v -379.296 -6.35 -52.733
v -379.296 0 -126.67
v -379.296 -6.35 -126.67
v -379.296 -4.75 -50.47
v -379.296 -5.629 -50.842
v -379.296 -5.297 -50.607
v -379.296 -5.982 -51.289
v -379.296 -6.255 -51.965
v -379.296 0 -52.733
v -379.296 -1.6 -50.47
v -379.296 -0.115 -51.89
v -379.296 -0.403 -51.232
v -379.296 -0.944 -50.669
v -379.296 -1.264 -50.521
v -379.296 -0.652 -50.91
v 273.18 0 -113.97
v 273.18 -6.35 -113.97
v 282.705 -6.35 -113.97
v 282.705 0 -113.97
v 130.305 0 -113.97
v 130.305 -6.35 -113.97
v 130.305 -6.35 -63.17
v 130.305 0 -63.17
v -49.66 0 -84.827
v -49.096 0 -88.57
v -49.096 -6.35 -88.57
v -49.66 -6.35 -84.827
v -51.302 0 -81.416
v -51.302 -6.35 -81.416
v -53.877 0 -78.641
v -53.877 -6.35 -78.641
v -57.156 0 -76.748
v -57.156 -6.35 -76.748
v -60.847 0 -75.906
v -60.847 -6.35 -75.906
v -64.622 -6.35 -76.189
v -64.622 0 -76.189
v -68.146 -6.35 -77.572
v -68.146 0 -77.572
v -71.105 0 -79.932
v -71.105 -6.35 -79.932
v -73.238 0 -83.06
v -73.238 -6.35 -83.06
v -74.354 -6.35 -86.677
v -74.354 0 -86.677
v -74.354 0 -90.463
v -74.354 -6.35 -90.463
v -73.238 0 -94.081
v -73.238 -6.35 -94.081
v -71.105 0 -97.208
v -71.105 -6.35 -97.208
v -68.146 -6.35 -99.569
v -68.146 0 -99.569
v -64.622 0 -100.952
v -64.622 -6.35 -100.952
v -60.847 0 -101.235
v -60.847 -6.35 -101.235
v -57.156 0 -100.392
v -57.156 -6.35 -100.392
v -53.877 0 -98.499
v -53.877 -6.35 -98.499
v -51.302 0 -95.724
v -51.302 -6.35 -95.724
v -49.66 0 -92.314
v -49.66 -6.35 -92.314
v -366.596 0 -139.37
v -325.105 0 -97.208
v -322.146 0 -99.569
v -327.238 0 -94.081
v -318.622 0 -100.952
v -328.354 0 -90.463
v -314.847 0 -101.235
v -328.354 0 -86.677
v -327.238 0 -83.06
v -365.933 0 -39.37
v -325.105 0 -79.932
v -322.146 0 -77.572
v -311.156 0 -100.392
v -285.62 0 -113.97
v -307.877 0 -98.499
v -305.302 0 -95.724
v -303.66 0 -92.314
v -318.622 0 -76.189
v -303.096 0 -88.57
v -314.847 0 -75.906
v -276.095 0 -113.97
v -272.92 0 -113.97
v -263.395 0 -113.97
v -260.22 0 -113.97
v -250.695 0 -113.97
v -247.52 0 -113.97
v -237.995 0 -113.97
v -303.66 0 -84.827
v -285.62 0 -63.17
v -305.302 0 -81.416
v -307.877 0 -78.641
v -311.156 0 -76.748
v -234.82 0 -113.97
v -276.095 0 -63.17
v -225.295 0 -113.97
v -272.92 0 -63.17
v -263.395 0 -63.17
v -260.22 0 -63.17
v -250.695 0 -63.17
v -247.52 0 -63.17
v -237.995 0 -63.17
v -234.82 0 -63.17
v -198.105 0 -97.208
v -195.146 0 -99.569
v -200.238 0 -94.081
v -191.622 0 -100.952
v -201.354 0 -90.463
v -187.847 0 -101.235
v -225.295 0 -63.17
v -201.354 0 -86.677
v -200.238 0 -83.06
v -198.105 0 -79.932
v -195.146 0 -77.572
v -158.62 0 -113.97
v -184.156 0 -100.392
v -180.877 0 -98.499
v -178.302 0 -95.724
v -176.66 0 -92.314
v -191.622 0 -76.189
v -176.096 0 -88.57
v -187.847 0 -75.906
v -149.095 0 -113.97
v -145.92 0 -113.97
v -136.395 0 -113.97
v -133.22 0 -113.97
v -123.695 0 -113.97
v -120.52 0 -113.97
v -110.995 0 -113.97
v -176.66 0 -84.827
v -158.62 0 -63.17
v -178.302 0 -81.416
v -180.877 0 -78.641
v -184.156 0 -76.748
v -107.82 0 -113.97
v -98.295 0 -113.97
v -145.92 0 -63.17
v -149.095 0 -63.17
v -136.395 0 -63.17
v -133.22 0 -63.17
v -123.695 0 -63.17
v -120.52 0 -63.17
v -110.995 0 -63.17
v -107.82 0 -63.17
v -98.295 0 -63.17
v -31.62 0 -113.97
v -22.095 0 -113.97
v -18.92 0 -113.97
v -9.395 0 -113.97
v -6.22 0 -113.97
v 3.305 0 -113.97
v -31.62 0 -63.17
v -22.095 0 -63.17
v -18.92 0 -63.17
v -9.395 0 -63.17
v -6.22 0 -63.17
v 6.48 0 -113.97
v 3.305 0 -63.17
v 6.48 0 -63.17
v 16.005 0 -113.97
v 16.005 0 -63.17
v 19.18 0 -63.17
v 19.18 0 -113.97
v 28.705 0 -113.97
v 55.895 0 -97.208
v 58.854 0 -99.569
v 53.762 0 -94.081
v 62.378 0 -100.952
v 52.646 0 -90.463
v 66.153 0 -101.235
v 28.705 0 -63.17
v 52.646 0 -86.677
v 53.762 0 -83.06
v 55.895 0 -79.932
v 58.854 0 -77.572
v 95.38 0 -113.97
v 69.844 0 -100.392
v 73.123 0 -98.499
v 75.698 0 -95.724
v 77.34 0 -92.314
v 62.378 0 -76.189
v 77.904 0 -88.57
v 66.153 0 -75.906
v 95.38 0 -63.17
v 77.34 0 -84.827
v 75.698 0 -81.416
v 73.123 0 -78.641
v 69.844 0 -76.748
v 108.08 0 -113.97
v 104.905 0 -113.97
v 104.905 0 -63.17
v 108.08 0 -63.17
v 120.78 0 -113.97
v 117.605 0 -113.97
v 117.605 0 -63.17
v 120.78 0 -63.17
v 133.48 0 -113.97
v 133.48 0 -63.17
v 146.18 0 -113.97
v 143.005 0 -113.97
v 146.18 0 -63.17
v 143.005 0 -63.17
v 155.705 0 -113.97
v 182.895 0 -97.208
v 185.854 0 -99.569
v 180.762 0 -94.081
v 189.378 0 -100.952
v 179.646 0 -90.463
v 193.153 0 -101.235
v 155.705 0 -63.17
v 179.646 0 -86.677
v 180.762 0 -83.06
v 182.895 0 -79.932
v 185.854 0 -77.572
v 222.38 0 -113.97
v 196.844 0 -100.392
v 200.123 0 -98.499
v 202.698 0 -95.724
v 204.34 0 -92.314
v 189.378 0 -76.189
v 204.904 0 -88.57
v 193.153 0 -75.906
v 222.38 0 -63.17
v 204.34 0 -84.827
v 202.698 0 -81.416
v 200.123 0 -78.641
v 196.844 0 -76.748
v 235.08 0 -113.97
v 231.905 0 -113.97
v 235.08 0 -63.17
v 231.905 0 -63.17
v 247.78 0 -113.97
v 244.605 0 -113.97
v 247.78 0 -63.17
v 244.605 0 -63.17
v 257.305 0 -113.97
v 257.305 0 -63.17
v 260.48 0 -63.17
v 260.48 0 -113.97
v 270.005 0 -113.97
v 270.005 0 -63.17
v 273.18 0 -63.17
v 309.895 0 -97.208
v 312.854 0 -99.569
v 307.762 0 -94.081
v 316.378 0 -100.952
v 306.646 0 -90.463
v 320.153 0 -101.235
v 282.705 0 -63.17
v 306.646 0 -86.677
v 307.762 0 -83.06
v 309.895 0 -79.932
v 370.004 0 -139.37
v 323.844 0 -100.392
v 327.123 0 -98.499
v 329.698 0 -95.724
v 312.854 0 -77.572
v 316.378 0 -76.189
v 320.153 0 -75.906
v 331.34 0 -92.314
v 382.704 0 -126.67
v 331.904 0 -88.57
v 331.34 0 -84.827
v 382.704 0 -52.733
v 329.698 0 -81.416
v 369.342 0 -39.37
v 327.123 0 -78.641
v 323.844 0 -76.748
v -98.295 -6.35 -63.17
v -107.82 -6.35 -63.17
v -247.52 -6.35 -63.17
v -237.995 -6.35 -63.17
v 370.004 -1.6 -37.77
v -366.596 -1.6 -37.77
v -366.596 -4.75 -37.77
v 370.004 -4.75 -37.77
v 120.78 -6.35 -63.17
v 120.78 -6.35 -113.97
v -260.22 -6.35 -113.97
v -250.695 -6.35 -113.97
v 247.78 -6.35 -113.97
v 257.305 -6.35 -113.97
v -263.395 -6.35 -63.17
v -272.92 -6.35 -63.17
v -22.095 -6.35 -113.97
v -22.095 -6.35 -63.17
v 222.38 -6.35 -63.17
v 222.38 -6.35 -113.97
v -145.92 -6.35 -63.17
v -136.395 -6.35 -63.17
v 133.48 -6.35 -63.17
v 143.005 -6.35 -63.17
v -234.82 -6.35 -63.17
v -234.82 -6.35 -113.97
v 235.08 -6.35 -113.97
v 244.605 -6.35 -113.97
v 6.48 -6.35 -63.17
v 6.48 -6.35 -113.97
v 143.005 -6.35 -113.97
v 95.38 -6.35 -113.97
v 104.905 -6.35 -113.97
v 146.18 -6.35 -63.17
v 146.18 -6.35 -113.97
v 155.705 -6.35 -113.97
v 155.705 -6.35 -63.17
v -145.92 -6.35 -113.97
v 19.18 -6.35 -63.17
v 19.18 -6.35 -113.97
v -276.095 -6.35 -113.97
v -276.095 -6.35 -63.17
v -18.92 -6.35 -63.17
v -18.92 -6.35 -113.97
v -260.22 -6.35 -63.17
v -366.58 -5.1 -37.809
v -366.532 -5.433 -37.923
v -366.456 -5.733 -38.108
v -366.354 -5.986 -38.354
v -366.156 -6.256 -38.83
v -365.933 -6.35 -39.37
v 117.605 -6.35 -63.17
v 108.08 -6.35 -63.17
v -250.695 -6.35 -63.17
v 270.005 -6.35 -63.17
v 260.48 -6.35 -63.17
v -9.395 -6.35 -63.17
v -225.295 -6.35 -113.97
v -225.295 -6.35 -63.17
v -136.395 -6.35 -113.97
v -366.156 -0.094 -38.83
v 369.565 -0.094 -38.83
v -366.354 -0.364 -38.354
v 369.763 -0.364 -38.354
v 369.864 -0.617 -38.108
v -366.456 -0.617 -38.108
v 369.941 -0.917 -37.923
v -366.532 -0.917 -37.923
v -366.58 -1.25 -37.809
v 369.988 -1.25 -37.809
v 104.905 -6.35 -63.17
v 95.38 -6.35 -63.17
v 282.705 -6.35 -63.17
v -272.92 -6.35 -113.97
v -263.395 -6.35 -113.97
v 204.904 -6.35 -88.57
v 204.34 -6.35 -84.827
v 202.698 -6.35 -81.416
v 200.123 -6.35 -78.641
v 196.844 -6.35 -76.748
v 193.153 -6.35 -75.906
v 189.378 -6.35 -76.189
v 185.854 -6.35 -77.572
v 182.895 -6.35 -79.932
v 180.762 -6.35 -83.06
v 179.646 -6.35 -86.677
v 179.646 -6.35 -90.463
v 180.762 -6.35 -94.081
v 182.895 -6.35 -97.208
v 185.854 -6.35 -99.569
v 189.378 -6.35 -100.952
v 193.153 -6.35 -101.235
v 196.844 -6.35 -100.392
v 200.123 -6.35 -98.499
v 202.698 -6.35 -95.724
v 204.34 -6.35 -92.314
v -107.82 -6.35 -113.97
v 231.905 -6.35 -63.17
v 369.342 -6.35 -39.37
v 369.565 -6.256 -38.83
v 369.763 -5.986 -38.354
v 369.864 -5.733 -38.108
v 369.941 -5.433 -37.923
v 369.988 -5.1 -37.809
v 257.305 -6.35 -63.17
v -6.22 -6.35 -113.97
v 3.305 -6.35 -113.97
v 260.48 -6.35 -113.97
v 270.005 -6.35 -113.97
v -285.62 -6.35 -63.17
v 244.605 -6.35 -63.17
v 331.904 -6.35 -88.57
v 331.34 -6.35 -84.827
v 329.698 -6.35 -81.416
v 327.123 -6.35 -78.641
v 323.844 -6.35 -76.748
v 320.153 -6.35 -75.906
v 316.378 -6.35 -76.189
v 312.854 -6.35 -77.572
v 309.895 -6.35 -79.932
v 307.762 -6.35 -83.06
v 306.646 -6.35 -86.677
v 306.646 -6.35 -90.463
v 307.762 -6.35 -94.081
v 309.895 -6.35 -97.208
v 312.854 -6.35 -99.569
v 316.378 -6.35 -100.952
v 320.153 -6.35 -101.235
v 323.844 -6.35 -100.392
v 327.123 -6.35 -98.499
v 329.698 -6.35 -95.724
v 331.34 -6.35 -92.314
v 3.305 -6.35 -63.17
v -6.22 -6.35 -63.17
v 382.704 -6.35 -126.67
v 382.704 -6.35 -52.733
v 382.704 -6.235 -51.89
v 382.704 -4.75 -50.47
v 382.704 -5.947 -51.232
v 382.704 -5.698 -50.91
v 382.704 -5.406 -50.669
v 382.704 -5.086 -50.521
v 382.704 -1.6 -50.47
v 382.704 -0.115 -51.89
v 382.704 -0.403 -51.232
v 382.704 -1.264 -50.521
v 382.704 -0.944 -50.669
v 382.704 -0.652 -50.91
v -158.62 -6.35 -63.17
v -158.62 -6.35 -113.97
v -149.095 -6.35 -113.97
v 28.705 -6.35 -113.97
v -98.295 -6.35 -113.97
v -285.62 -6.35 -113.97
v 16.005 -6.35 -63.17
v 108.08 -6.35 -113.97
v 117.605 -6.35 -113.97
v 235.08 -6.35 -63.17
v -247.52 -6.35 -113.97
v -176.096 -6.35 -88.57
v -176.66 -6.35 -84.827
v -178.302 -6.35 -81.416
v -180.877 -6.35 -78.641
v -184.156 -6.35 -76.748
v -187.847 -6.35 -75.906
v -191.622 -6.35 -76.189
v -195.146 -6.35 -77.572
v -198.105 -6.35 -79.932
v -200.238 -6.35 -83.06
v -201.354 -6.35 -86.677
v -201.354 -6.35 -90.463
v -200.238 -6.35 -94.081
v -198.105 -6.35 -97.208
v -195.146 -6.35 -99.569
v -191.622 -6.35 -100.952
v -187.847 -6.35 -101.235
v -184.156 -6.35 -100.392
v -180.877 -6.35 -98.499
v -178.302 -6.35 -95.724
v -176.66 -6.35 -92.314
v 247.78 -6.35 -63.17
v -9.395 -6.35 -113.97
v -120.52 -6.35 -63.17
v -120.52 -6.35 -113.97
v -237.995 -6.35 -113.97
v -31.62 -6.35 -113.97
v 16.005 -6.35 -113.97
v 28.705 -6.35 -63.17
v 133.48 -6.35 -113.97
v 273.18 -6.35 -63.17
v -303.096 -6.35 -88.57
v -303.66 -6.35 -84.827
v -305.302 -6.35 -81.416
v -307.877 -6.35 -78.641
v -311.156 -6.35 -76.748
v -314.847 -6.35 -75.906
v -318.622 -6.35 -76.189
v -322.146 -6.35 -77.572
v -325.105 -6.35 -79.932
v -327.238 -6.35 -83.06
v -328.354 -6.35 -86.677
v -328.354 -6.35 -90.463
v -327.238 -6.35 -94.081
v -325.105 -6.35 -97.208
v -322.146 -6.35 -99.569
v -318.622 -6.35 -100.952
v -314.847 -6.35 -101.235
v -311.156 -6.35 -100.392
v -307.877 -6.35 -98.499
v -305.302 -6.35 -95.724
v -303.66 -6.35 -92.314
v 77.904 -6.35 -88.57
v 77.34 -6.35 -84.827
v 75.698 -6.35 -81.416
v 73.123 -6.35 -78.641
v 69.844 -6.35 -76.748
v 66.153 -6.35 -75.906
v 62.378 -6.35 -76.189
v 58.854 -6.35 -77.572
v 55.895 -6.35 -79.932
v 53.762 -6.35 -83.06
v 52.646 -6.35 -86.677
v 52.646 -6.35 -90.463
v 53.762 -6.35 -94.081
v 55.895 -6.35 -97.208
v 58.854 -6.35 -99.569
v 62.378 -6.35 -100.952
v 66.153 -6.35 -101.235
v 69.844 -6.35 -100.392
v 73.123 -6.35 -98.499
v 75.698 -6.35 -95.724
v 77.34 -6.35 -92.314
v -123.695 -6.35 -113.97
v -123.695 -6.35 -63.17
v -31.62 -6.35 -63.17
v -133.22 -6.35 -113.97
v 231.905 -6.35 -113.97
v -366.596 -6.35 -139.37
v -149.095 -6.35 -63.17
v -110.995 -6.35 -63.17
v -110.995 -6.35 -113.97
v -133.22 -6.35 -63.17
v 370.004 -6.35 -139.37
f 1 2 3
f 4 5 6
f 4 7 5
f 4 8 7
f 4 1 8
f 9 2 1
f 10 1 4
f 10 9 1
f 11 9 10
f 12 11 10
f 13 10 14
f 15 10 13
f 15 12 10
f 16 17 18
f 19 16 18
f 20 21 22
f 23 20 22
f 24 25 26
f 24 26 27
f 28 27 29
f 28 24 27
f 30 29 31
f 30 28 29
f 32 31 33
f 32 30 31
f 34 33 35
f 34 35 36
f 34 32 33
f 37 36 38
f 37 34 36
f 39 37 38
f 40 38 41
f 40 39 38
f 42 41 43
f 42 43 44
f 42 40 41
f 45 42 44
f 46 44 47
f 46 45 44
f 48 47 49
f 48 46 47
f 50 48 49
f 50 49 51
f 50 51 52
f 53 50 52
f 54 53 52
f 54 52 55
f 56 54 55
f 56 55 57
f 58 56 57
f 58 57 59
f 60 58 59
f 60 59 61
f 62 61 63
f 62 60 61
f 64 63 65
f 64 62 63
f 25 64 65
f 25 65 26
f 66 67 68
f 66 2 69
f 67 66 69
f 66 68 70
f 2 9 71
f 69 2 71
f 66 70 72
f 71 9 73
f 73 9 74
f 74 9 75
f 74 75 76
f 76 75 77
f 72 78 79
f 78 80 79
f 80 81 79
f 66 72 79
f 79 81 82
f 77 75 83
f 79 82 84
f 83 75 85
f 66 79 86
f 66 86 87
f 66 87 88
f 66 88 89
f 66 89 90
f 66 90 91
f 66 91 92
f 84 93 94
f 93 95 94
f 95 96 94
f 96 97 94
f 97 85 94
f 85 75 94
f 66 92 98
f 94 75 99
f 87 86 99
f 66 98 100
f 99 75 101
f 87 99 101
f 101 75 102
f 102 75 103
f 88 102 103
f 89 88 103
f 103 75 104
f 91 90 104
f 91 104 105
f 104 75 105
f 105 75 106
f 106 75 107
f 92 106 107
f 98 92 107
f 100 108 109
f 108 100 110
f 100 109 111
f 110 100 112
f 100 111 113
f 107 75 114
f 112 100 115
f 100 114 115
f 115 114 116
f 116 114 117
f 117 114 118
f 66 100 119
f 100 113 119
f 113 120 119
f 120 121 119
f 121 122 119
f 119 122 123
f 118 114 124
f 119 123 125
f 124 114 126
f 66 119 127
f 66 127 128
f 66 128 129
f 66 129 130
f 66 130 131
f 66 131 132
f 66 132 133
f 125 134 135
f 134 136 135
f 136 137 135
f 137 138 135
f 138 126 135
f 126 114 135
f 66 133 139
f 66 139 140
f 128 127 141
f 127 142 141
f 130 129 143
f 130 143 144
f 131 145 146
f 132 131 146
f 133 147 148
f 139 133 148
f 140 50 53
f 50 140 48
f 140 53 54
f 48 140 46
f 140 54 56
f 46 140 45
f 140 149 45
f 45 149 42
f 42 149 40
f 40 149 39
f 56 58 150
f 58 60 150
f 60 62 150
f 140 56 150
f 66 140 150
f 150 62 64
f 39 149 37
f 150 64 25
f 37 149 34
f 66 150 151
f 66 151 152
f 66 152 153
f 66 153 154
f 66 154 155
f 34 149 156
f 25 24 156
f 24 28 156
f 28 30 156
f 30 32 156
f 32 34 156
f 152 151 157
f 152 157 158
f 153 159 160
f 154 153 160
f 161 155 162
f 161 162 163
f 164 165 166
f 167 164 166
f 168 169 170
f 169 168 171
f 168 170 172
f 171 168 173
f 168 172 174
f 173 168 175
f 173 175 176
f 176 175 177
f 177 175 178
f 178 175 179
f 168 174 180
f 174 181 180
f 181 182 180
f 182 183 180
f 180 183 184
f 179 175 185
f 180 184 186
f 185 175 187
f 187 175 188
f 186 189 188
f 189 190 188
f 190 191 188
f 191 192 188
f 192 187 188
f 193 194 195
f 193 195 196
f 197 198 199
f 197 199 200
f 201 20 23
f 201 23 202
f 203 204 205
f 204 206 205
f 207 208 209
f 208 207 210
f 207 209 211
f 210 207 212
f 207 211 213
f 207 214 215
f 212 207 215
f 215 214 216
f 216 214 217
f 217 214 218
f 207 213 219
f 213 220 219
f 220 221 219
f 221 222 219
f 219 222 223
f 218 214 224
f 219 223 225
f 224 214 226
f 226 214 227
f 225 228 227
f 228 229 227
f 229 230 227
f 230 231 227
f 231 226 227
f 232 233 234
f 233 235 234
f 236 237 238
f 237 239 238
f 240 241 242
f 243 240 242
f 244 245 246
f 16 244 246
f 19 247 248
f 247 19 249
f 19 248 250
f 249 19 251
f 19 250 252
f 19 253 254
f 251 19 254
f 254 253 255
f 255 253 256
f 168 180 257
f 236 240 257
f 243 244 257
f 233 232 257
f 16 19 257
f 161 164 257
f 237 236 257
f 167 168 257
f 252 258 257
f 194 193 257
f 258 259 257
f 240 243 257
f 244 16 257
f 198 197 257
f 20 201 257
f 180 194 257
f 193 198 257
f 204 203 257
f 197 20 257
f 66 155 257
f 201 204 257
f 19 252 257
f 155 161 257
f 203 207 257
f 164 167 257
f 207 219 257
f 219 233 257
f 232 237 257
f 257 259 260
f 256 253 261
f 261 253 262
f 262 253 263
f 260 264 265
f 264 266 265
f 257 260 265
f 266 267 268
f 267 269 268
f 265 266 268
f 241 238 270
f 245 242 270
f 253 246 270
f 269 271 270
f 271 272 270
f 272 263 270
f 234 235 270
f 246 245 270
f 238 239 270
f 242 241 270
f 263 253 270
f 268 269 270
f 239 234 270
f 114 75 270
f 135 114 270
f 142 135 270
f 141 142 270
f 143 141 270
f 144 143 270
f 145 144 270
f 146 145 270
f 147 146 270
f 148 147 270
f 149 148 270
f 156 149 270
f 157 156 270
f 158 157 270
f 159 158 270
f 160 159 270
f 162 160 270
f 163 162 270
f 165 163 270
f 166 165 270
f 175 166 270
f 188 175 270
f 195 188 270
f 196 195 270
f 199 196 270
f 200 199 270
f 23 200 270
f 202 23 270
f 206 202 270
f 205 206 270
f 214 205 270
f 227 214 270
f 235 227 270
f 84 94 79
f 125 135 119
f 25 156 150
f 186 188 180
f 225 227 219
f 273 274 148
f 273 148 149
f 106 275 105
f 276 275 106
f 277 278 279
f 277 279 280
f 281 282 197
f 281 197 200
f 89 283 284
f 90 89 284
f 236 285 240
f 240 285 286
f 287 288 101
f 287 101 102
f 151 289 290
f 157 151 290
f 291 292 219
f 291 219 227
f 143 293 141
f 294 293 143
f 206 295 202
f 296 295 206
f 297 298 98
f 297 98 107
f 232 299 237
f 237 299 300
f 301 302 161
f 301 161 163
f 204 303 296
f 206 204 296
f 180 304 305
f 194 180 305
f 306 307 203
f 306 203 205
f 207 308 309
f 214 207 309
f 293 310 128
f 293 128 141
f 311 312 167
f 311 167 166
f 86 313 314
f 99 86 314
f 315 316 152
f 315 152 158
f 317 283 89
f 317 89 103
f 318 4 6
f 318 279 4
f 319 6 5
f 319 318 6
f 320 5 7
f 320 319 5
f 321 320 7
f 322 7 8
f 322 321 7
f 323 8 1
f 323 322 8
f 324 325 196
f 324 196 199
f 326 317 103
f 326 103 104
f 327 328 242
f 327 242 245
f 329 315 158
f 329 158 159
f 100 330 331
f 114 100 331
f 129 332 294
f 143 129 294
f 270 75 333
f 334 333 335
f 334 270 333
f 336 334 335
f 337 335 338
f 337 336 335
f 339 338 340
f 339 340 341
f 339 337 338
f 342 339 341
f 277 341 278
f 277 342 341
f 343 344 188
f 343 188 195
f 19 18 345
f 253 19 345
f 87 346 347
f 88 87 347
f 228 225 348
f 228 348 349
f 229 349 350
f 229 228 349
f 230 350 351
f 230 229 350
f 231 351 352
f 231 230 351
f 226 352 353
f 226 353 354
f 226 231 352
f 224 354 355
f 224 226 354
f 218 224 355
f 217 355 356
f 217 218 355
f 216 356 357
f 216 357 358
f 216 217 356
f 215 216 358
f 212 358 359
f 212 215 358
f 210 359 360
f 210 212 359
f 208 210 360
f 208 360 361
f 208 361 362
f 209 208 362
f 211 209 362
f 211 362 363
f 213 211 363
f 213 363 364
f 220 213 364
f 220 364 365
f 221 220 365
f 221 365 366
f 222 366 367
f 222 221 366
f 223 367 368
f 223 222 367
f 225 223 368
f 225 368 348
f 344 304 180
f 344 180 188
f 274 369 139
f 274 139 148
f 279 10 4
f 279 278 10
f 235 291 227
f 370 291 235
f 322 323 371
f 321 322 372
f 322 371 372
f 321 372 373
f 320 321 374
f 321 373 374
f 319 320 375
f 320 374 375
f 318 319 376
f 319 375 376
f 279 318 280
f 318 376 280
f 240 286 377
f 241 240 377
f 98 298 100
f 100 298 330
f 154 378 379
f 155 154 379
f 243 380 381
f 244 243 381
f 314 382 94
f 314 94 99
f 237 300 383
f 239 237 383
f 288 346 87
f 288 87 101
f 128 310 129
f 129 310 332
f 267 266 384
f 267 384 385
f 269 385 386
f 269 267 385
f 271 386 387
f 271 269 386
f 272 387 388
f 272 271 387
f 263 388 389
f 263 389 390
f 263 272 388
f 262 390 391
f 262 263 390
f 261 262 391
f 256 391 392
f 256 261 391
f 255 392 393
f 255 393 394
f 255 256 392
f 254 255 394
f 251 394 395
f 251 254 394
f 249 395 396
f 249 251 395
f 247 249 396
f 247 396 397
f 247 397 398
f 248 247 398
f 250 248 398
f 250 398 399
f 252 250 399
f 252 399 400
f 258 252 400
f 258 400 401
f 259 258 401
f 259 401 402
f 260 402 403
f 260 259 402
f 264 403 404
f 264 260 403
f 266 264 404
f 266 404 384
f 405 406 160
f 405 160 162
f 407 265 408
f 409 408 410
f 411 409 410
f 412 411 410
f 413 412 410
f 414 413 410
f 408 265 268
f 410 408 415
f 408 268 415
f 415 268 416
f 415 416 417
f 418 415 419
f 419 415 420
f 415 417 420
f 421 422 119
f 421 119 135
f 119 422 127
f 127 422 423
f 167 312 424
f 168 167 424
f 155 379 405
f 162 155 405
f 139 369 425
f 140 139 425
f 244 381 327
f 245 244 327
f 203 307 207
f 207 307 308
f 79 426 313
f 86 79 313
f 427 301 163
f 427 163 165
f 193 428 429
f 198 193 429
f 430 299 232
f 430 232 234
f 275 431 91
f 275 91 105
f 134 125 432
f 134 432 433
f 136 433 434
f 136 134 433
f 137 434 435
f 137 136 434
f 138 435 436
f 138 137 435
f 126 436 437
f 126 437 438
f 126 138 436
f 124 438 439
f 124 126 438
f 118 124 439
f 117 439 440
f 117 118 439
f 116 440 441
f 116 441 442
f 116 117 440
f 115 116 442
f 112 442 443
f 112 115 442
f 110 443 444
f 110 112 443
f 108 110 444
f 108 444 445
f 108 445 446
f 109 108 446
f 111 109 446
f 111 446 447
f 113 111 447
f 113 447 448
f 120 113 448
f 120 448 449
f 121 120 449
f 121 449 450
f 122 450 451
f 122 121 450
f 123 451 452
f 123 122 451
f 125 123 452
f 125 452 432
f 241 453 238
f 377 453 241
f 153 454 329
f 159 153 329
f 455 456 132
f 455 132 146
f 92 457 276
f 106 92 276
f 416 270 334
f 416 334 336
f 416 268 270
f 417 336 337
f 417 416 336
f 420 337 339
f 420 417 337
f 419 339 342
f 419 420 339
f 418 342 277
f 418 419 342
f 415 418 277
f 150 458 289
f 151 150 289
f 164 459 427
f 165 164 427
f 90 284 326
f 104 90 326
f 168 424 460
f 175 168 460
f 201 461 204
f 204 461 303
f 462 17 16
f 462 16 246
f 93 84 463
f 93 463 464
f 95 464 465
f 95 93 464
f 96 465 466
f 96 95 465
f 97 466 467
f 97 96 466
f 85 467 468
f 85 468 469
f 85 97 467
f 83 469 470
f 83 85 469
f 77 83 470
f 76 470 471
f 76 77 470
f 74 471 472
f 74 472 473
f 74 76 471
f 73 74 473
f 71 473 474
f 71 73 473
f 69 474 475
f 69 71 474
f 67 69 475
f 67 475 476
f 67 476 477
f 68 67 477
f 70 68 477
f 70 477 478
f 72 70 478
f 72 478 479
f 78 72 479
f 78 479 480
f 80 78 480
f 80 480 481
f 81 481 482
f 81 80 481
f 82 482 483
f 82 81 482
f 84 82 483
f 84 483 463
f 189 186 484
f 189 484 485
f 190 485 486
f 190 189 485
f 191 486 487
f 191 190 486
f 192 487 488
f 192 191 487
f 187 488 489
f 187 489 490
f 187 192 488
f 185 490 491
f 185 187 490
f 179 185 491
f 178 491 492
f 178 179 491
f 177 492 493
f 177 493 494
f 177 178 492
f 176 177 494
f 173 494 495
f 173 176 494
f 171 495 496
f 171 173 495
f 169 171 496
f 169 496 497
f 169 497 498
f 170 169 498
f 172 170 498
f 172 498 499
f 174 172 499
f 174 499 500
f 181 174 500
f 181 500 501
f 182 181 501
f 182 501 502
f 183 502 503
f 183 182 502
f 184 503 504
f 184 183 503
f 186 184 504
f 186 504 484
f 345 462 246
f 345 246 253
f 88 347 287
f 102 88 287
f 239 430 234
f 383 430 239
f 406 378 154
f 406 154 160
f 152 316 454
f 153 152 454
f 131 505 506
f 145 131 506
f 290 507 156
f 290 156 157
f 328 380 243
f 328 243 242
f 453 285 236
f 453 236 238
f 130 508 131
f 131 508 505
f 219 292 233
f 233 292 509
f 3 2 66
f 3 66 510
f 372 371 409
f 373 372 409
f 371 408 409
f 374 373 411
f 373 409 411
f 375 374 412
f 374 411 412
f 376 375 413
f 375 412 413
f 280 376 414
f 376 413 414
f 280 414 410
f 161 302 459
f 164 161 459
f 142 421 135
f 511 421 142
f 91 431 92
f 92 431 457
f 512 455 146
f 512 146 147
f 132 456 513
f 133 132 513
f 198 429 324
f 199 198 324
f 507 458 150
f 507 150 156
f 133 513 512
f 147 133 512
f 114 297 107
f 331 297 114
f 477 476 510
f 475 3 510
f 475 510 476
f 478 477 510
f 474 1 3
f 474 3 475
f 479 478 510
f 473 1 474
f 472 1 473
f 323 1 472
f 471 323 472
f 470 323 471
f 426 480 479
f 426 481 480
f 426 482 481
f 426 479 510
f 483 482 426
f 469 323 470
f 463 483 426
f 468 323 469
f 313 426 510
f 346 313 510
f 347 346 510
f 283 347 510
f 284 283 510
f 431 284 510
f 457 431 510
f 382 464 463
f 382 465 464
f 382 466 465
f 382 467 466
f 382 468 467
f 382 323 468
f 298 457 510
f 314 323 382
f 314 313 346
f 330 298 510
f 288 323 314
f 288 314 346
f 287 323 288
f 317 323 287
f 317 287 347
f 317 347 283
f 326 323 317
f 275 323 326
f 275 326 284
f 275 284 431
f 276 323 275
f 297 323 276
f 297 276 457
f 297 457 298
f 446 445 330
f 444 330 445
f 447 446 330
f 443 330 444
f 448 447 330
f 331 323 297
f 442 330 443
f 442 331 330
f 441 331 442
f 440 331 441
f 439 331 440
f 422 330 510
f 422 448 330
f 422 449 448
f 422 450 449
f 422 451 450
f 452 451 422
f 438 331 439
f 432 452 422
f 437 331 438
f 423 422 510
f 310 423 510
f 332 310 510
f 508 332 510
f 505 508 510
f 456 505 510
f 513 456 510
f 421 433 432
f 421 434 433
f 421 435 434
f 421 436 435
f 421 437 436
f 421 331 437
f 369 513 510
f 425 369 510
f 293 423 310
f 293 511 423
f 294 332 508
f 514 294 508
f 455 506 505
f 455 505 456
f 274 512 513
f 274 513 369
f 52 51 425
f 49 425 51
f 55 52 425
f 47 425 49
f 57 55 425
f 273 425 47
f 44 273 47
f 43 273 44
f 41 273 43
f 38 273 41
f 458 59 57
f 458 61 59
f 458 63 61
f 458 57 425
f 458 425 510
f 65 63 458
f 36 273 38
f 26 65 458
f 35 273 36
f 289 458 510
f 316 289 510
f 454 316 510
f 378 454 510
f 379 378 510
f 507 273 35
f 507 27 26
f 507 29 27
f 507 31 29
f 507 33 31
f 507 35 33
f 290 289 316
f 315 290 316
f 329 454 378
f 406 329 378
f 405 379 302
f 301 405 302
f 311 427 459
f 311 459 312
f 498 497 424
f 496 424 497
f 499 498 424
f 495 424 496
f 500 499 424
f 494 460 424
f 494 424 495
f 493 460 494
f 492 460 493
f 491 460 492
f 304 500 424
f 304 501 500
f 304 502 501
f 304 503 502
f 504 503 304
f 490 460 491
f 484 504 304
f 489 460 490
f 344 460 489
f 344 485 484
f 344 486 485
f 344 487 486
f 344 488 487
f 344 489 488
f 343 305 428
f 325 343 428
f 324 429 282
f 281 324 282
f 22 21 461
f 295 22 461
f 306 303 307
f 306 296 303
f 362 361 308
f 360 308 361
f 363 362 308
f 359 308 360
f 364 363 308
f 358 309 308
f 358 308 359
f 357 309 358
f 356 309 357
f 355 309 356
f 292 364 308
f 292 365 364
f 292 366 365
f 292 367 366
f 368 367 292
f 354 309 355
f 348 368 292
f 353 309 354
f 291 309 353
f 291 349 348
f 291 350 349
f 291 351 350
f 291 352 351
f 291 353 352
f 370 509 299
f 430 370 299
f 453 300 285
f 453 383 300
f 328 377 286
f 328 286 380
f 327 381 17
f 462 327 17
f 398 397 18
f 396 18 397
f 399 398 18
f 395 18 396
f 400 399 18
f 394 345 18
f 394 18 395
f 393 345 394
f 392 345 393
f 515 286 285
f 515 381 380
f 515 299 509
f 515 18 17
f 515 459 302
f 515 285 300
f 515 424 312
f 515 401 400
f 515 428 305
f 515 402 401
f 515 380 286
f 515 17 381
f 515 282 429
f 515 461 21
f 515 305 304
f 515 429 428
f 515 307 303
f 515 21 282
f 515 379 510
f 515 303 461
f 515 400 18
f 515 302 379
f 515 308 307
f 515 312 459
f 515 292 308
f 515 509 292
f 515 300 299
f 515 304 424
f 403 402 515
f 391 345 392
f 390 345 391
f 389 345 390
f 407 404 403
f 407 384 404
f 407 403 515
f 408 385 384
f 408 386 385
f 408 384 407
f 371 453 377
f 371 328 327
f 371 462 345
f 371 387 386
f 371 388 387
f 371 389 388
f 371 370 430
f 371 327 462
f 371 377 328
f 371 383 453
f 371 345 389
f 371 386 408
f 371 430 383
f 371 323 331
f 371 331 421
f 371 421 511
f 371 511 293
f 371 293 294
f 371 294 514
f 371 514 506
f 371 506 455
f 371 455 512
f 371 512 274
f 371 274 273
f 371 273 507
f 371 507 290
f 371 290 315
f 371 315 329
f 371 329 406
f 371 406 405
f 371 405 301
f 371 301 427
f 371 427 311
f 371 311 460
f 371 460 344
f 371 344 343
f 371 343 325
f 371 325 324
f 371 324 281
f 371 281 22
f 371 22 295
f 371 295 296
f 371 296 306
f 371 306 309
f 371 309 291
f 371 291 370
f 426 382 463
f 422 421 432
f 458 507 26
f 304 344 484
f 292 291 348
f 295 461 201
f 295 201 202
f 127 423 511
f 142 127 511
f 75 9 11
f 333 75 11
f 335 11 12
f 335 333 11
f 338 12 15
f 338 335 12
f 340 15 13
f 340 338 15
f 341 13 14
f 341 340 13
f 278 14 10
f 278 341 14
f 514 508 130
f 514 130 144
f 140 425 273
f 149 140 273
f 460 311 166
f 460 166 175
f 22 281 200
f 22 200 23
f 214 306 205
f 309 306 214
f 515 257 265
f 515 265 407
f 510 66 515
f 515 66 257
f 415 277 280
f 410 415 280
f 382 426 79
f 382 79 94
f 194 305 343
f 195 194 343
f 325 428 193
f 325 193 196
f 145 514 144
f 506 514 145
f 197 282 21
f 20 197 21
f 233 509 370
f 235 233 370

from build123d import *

# Parameters (mm, degrees)
F0_W     = 762
F0_H     = 101.6
F0_R     = 12.7
F1_DEPTH = 6.35
F2_W     = 9.525
F2_H     = 50.8
F3_DEPTH = 6.351
F4_SIZE  = 12.7
F5_R     = 1.6002


with BuildPart() as f1:
    # F0 (on Front) → F1 (new body)
    with BuildSketch(Plane.XZ):
        with Locations((1.7043538392, -88.5701854873)):
            Rectangle(F0_W, F0_H)
        with Locations((-315.7956461608, -88.5701854873)):
            Circle(F0_R, mode=Mode.SUBTRACT)
        with Locations((-188.7956461608, -88.5701854873)):
            Circle(F0_R, mode=Mode.SUBTRACT)
        with Locations((-61.7956461608, -88.5701854873)):
            Circle(F0_R, mode=Mode.SUBTRACT)
        with Locations((65.2043538392, -88.5701854873)):
            Circle(F0_R, mode=Mode.SUBTRACT)
        with Locations((192.2043538392, -88.5701854873)):
            Circle(F0_R, mode=Mode.SUBTRACT)
        with Locations((319.2043538392, -88.5701854873)):
            Circle(F0_R, mode=Mode.SUBTRACT)
    extrude(amount=F1_DEPTH)

    # F2 (on face) → F3 (cut, through all)
    with BuildSketch(Plane.XZ.offset(6.35)):
        with Locations((-280.8579461608, -88.5701854873)):
            Rectangle(F2_W, F2_H)
        with Locations((-268.1579461608, -88.5701854873)):
            Rectangle(F2_W, F2_H)
        with Locations((-255.4579461608, -88.5701854873)):
            Rectangle(F2_W, F2_H)
        with Locations((-242.7579461608, -88.5701854873)):
            Rectangle(F2_W, F2_H)
        with Locations((-230.0579461608, -88.5701854873)):
            Rectangle(F2_W, F2_H)
        with Locations((-26.8579461608, -88.5701854873)):
            Rectangle(F2_W, F2_H)
        with Locations((-14.1579461608, -88.5701854873)):
            Rectangle(F2_W, F2_H)
        with Locations((-1.4579461608, -88.5701854873)):
            Rectangle(F2_W, F2_H)
        with Locations((11.2420538392, -88.5701854873)):
            Rectangle(F2_W, F2_H)
        with Locations((23.9420538392, -88.5701854873)):
            Rectangle(F2_W, F2_H)
        with Locations((100.1420538392, -88.5701854873)):
            Rectangle(F2_W, F2_H)
        with Locations((112.8420538392, -88.5701854873)):
            Rectangle(F2_W, F2_H)
        with Locations((125.5420538392, -88.5701854873)):
            Rectangle(F2_W, F2_H)
        with Locations((138.2420538392, -88.5701854873)):
            Rectangle(F2_W, F2_H)
        with Locations((150.9420538392, -88.5701854873)):
            Rectangle(F2_W, F2_H)
        with Locations((227.1420538392, -88.5701854873)):
            Rectangle(F2_W, F2_H)
        with Locations((239.8420538392, -88.5701854873)):
            Rectangle(F2_W, F2_H)
        with Locations((252.5420538392, -88.5701854873)):
            Rectangle(F2_W, F2_H)
        with Locations((265.2420538392, -88.5701854873)):
            Rectangle(F2_W, F2_H)
        with Locations((277.9420538392, -88.5701854873)):
            Rectangle(F2_W, F2_H)
        with Locations((-153.8579461608, -88.5701854873)):
            Rectangle(F2_W, F2_H)
        with Locations((-141.1579461608, -88.5701854873)):
            Rectangle(F2_W, F2_H)
        with Locations((-128.4579461608, -88.5701854873)):
            Rectangle(F2_W, F2_H)
        with Locations((-115.7579461608, -88.5701854873)):
            Rectangle(F2_W, F2_H)
        with Locations((-103.0579461608, -88.5701854873)):
            Rectangle(F2_W, F2_H)
    extrude(amount=-F3_DEPTH, mode=Mode.SUBTRACT)

    # F4
    f4_edges = [f1.edges().sort_by_distance(p)[0] for p in [
        (-379.295646, -3.175, -37.770185),
        (-379.295646, -3.175, -139.370185),
        (382.704354, -3.175, -37.770185),
        (382.704354, -3.175, -139.370185),
    ]]
    chamfer(f4_edges, length=F4_SIZE)

    # F5
    f5_edges = [f1.edges().sort_by_distance(p)[0] for p in [
        (1.704354, -6.35, -37.770185),
        (1.704354, 0, -37.770185),
        (-372.945646, -6.35, -44.120185),
        (-372.945646, 0, -44.120185),
        (376.354354, 0, -44.120185),
        (376.354354, -6.35, -44.120185),
    ]]
    fillet(f5_edges, radius=F5_R)


solid = f1.part
